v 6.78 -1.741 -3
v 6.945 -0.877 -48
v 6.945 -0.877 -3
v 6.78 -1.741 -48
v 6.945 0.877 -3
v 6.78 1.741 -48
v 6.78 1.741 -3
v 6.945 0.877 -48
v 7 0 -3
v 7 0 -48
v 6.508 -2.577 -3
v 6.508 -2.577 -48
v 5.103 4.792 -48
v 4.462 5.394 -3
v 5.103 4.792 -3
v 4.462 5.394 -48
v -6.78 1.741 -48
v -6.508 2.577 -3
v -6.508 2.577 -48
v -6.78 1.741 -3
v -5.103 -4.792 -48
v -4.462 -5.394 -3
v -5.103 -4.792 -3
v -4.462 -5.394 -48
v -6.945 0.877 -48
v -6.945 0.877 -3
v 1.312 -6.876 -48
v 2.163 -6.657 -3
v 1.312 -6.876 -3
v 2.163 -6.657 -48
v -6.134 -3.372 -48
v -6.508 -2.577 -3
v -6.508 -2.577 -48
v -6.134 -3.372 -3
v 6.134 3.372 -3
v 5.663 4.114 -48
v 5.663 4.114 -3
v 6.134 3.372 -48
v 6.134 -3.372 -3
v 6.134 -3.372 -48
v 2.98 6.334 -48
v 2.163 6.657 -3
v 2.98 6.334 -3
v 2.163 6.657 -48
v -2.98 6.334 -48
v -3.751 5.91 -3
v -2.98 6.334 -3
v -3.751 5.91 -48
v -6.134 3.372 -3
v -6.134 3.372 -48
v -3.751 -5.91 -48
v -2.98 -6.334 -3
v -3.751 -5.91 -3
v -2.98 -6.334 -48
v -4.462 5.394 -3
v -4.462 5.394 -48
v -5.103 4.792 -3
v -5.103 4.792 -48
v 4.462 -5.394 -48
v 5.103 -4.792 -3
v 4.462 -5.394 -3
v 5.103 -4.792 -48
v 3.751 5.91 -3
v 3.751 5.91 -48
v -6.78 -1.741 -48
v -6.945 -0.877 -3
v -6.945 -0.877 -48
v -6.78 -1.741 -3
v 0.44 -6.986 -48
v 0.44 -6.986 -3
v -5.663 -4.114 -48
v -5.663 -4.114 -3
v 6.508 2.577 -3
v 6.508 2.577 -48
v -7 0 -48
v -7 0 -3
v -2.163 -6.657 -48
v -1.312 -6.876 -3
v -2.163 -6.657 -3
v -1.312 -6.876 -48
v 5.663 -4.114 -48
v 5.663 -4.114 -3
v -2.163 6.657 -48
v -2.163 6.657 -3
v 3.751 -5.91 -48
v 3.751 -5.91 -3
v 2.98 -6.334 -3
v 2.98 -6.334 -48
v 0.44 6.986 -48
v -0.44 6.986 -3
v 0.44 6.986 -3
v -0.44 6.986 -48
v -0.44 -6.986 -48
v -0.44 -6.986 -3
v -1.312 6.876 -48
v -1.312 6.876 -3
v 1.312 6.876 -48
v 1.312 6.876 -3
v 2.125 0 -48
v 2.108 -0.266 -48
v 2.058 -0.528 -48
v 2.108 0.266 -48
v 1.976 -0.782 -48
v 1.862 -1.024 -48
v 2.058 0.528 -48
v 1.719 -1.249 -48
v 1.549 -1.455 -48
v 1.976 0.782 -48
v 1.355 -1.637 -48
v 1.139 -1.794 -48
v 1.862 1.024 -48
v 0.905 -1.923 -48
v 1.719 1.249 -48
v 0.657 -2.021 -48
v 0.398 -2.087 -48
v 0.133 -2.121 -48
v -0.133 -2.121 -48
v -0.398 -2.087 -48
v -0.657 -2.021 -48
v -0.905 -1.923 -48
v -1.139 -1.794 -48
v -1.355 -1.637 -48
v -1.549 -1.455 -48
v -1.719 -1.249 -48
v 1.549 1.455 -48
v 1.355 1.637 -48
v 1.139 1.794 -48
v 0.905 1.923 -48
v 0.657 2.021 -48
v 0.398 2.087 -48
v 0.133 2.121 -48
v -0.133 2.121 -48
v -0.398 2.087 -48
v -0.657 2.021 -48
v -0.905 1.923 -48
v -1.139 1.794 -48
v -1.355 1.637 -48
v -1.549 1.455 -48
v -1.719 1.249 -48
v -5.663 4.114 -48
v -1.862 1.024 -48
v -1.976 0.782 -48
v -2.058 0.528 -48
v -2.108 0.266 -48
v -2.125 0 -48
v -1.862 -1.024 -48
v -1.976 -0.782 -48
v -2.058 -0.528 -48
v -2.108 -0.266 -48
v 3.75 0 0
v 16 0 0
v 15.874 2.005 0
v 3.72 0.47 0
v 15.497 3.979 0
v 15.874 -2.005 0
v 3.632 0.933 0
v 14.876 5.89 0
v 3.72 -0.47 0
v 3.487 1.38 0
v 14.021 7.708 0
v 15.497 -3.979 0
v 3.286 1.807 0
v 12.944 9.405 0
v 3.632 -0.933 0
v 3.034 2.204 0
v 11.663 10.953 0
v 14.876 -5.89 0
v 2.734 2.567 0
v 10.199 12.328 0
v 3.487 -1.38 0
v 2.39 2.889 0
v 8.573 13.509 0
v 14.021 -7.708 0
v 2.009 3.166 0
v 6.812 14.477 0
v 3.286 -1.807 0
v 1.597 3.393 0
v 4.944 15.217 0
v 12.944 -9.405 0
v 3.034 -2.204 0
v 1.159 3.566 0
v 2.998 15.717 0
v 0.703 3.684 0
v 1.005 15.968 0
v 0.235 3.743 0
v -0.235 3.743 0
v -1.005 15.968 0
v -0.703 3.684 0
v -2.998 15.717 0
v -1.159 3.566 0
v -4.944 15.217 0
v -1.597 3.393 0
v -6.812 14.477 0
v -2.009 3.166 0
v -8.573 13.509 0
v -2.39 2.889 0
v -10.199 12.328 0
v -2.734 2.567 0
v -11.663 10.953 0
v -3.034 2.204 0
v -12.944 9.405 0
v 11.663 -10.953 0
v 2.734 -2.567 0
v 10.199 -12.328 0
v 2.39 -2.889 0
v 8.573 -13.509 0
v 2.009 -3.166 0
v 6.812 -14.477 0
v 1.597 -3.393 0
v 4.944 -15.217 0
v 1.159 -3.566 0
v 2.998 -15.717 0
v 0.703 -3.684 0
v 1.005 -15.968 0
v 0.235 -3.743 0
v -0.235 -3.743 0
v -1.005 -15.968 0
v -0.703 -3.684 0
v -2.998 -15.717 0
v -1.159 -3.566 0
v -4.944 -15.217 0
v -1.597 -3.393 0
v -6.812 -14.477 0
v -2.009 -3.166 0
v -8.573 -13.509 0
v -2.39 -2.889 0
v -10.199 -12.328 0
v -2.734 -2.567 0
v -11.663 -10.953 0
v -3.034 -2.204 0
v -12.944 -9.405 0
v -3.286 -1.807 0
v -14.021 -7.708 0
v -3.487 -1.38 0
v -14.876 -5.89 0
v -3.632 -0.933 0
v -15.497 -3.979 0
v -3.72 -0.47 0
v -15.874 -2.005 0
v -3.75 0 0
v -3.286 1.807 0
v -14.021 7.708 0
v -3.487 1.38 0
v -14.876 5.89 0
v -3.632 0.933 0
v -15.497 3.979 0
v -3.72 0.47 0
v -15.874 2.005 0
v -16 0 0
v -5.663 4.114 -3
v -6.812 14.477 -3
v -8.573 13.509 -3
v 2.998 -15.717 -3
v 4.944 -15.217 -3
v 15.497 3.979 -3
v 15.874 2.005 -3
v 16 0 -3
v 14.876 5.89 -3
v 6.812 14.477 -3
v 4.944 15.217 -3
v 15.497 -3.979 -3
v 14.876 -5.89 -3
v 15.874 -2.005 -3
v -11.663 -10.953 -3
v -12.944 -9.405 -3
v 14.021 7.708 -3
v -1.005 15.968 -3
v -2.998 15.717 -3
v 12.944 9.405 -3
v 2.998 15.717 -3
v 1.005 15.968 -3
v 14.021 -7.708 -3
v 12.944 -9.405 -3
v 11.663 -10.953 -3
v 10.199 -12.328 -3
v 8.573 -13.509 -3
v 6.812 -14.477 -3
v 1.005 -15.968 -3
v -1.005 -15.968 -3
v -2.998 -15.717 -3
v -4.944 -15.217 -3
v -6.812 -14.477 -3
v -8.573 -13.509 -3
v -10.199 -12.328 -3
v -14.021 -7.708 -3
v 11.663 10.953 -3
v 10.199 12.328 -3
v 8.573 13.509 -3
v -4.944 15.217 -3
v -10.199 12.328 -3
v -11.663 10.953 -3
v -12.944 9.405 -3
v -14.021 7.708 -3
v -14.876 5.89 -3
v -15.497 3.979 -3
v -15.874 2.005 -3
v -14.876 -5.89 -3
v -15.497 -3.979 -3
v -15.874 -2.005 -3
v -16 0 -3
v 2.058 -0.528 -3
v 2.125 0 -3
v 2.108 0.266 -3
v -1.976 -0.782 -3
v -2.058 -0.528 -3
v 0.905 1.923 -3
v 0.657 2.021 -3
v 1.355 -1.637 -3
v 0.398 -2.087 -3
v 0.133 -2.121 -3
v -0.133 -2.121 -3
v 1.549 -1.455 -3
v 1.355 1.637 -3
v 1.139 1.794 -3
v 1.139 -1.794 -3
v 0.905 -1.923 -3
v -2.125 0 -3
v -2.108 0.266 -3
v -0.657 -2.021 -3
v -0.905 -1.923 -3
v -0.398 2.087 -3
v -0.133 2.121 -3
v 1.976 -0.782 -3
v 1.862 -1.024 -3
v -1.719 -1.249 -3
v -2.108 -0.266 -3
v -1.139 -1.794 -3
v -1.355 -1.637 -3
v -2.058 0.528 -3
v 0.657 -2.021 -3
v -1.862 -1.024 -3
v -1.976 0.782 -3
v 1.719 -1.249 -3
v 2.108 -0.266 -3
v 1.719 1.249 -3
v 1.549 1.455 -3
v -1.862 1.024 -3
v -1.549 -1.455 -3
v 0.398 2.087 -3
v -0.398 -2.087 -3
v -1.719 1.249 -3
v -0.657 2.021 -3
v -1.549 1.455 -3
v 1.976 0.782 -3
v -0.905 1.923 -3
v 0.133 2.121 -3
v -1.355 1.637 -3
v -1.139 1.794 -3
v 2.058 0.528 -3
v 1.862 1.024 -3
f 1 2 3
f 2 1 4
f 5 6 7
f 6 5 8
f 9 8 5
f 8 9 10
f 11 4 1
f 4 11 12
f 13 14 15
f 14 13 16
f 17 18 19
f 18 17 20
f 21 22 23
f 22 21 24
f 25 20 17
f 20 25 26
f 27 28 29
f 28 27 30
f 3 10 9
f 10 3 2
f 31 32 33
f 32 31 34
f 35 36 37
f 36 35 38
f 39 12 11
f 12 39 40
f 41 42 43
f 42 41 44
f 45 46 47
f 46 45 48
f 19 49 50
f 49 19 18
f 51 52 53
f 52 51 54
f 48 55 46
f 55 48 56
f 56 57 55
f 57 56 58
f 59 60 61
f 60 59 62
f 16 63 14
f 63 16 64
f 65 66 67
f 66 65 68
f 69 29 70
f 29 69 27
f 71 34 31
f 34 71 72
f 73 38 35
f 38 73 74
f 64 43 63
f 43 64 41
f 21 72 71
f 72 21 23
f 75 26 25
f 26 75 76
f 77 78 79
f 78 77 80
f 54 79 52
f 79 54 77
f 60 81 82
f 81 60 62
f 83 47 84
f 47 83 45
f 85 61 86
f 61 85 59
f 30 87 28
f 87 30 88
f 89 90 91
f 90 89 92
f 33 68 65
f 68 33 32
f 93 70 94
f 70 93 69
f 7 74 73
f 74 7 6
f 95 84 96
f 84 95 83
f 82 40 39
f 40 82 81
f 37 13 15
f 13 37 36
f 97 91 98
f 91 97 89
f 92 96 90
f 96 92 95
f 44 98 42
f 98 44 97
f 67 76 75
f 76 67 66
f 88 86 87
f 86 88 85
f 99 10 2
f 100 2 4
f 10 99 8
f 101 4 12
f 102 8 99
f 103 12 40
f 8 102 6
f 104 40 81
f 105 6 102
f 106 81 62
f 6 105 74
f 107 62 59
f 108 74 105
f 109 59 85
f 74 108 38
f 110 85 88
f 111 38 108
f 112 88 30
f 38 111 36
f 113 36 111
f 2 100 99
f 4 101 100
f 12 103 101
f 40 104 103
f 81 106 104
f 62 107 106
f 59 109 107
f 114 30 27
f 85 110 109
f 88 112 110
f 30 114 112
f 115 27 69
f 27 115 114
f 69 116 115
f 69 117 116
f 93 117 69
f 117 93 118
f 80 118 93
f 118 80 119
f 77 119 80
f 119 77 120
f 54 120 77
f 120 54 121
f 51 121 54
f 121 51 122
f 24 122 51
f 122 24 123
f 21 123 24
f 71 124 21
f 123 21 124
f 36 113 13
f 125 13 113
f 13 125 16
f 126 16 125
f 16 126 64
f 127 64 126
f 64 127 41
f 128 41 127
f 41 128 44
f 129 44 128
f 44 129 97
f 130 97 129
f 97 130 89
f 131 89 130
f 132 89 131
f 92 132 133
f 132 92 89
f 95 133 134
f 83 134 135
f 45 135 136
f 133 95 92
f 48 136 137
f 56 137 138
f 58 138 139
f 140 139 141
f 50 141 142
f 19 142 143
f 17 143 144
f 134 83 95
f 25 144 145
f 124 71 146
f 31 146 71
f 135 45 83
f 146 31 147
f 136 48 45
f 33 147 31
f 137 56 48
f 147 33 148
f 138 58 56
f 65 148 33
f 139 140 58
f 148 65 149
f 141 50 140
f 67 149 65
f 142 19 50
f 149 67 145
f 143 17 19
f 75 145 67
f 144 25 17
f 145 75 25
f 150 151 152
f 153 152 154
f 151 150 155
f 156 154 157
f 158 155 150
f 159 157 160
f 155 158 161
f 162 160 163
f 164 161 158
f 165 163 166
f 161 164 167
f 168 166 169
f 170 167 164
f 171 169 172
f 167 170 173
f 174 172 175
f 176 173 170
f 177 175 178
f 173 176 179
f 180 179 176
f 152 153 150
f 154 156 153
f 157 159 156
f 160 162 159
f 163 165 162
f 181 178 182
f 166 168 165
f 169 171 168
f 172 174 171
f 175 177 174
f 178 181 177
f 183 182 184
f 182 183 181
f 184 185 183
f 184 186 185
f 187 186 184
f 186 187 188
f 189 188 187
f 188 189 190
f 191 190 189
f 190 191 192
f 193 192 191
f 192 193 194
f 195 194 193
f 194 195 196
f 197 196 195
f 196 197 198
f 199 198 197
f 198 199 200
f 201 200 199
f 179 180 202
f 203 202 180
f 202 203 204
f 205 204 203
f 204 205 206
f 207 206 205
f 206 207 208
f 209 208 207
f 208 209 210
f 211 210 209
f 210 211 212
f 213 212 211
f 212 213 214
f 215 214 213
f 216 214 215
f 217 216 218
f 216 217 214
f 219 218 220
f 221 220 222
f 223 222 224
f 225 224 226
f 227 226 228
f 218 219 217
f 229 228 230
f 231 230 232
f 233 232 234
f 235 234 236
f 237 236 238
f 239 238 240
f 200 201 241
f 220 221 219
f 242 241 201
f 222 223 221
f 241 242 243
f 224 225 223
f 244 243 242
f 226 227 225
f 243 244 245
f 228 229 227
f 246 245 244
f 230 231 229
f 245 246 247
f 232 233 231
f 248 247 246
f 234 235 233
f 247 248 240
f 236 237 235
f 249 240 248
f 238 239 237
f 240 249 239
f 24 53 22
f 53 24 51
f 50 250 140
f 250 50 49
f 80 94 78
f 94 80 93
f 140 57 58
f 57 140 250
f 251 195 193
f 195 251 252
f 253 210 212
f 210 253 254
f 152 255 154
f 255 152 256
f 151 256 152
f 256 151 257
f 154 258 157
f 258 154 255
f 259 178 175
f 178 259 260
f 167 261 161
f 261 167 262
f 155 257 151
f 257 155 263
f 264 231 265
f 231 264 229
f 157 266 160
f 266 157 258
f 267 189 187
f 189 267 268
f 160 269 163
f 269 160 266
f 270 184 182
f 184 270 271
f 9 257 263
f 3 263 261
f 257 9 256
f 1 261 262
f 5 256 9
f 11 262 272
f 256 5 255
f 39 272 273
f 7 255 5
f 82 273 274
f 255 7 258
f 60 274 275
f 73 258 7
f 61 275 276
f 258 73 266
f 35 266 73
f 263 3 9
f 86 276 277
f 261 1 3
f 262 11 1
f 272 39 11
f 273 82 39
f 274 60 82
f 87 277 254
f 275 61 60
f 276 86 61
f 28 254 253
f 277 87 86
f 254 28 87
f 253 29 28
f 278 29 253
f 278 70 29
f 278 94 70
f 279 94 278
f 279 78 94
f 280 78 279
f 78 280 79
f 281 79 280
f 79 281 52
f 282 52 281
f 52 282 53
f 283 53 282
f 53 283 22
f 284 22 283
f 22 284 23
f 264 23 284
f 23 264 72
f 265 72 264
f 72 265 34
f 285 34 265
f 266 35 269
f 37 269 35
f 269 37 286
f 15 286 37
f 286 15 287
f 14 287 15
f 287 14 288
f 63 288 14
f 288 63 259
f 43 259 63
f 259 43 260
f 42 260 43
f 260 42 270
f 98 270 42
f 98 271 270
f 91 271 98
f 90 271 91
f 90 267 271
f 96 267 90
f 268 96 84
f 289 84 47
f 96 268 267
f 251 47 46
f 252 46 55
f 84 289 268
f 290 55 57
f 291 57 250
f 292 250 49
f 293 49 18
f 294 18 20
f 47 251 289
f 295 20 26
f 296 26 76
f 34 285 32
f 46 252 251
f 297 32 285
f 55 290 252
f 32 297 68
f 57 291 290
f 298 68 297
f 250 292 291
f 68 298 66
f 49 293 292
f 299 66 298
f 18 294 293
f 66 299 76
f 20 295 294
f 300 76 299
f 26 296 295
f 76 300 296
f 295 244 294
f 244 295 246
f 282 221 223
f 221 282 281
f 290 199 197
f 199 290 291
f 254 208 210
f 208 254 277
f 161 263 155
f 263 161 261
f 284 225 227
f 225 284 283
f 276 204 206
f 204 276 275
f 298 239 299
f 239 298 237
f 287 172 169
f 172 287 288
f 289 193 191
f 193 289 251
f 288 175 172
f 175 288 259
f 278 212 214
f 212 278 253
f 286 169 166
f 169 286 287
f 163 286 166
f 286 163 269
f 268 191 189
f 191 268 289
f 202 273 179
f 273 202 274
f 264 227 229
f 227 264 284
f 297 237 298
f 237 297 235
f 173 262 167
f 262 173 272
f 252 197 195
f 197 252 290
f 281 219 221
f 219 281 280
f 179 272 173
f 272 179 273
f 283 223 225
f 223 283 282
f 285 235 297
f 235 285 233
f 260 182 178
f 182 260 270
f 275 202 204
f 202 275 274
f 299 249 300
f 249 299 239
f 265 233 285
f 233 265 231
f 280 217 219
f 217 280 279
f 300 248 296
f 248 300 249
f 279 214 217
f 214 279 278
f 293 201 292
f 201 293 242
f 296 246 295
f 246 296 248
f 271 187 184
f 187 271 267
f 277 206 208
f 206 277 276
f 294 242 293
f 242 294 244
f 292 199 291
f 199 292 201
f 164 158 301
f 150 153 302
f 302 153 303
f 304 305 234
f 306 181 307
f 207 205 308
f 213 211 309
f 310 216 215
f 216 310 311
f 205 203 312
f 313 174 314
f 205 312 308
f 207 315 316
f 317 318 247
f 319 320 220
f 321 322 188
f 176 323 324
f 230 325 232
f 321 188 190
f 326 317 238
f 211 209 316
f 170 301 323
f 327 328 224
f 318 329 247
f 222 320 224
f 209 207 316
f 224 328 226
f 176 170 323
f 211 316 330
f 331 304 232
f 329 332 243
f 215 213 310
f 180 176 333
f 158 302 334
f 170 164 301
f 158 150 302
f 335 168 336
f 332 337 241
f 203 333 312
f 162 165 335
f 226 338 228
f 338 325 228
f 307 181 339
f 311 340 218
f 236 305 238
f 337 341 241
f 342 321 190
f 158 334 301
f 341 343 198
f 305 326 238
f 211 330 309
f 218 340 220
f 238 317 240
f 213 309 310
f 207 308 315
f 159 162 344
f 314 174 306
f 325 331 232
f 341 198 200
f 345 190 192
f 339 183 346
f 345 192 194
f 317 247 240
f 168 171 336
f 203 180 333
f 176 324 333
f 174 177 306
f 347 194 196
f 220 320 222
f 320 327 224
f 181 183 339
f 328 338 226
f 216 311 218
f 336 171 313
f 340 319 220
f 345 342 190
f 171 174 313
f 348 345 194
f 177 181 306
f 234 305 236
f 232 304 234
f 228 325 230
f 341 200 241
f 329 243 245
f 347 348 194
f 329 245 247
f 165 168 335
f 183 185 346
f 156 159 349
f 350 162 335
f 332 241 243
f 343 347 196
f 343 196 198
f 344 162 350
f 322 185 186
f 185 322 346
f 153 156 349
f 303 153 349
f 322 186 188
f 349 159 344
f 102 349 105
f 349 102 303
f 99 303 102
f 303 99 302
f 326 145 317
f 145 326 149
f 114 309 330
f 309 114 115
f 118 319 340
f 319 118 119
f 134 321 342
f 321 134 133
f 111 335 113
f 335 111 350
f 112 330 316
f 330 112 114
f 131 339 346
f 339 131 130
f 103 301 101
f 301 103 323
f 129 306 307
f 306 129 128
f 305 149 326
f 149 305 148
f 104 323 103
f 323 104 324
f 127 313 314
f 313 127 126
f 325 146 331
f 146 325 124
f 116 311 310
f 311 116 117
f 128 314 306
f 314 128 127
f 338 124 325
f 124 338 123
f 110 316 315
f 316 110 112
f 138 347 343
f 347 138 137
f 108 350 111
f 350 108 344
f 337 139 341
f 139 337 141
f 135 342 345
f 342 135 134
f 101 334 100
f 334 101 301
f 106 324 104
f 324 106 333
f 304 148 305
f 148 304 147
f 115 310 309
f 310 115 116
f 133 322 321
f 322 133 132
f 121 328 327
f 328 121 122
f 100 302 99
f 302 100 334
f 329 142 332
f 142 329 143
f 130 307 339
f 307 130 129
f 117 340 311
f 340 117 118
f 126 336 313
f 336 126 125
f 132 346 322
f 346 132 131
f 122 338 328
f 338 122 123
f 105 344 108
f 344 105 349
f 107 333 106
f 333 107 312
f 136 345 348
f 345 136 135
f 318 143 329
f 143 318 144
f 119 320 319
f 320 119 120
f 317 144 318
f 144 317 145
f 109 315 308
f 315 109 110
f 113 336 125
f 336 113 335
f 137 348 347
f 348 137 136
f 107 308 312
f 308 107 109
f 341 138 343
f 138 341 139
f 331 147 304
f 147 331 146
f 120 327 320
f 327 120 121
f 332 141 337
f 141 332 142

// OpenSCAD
$fn = 50;


difference() {
	union() {
		translate(v = [0, 0, -48.0000000000]) {
			cylinder(h = 48, r = 7.0000000000);
		}
		translate(v = [0, 0, -3.0000000000]) {
			cylinder(h = 3, r = 16.0000000000);
		}
	}
	union() {
		translate(v = [0, 0, 0]) {
			rotate(a = [0, 0, 0]) {
				difference() {
					union() {
						#translate(v = [0, 0, -48.0000000000]) {
							cylinder(h = 48, r = 2.0000000000);
						}
						#translate(v = [0, 0, -3]) {
							cylinder(h = 3, r1 = 2.1250000000, r2 = 3.7500000000);
						}
						#translate(v = [0, 0, -48.0000000000]) {
							cylinder(h = 48, r = 2.1250000000);
						}
						#translate(v = [0, 0, -48.0000000000]) {
							cylinder(h = 48, r = 2.0000000000);
						}
					}
					union();
				}
			}
		}
	}
}
